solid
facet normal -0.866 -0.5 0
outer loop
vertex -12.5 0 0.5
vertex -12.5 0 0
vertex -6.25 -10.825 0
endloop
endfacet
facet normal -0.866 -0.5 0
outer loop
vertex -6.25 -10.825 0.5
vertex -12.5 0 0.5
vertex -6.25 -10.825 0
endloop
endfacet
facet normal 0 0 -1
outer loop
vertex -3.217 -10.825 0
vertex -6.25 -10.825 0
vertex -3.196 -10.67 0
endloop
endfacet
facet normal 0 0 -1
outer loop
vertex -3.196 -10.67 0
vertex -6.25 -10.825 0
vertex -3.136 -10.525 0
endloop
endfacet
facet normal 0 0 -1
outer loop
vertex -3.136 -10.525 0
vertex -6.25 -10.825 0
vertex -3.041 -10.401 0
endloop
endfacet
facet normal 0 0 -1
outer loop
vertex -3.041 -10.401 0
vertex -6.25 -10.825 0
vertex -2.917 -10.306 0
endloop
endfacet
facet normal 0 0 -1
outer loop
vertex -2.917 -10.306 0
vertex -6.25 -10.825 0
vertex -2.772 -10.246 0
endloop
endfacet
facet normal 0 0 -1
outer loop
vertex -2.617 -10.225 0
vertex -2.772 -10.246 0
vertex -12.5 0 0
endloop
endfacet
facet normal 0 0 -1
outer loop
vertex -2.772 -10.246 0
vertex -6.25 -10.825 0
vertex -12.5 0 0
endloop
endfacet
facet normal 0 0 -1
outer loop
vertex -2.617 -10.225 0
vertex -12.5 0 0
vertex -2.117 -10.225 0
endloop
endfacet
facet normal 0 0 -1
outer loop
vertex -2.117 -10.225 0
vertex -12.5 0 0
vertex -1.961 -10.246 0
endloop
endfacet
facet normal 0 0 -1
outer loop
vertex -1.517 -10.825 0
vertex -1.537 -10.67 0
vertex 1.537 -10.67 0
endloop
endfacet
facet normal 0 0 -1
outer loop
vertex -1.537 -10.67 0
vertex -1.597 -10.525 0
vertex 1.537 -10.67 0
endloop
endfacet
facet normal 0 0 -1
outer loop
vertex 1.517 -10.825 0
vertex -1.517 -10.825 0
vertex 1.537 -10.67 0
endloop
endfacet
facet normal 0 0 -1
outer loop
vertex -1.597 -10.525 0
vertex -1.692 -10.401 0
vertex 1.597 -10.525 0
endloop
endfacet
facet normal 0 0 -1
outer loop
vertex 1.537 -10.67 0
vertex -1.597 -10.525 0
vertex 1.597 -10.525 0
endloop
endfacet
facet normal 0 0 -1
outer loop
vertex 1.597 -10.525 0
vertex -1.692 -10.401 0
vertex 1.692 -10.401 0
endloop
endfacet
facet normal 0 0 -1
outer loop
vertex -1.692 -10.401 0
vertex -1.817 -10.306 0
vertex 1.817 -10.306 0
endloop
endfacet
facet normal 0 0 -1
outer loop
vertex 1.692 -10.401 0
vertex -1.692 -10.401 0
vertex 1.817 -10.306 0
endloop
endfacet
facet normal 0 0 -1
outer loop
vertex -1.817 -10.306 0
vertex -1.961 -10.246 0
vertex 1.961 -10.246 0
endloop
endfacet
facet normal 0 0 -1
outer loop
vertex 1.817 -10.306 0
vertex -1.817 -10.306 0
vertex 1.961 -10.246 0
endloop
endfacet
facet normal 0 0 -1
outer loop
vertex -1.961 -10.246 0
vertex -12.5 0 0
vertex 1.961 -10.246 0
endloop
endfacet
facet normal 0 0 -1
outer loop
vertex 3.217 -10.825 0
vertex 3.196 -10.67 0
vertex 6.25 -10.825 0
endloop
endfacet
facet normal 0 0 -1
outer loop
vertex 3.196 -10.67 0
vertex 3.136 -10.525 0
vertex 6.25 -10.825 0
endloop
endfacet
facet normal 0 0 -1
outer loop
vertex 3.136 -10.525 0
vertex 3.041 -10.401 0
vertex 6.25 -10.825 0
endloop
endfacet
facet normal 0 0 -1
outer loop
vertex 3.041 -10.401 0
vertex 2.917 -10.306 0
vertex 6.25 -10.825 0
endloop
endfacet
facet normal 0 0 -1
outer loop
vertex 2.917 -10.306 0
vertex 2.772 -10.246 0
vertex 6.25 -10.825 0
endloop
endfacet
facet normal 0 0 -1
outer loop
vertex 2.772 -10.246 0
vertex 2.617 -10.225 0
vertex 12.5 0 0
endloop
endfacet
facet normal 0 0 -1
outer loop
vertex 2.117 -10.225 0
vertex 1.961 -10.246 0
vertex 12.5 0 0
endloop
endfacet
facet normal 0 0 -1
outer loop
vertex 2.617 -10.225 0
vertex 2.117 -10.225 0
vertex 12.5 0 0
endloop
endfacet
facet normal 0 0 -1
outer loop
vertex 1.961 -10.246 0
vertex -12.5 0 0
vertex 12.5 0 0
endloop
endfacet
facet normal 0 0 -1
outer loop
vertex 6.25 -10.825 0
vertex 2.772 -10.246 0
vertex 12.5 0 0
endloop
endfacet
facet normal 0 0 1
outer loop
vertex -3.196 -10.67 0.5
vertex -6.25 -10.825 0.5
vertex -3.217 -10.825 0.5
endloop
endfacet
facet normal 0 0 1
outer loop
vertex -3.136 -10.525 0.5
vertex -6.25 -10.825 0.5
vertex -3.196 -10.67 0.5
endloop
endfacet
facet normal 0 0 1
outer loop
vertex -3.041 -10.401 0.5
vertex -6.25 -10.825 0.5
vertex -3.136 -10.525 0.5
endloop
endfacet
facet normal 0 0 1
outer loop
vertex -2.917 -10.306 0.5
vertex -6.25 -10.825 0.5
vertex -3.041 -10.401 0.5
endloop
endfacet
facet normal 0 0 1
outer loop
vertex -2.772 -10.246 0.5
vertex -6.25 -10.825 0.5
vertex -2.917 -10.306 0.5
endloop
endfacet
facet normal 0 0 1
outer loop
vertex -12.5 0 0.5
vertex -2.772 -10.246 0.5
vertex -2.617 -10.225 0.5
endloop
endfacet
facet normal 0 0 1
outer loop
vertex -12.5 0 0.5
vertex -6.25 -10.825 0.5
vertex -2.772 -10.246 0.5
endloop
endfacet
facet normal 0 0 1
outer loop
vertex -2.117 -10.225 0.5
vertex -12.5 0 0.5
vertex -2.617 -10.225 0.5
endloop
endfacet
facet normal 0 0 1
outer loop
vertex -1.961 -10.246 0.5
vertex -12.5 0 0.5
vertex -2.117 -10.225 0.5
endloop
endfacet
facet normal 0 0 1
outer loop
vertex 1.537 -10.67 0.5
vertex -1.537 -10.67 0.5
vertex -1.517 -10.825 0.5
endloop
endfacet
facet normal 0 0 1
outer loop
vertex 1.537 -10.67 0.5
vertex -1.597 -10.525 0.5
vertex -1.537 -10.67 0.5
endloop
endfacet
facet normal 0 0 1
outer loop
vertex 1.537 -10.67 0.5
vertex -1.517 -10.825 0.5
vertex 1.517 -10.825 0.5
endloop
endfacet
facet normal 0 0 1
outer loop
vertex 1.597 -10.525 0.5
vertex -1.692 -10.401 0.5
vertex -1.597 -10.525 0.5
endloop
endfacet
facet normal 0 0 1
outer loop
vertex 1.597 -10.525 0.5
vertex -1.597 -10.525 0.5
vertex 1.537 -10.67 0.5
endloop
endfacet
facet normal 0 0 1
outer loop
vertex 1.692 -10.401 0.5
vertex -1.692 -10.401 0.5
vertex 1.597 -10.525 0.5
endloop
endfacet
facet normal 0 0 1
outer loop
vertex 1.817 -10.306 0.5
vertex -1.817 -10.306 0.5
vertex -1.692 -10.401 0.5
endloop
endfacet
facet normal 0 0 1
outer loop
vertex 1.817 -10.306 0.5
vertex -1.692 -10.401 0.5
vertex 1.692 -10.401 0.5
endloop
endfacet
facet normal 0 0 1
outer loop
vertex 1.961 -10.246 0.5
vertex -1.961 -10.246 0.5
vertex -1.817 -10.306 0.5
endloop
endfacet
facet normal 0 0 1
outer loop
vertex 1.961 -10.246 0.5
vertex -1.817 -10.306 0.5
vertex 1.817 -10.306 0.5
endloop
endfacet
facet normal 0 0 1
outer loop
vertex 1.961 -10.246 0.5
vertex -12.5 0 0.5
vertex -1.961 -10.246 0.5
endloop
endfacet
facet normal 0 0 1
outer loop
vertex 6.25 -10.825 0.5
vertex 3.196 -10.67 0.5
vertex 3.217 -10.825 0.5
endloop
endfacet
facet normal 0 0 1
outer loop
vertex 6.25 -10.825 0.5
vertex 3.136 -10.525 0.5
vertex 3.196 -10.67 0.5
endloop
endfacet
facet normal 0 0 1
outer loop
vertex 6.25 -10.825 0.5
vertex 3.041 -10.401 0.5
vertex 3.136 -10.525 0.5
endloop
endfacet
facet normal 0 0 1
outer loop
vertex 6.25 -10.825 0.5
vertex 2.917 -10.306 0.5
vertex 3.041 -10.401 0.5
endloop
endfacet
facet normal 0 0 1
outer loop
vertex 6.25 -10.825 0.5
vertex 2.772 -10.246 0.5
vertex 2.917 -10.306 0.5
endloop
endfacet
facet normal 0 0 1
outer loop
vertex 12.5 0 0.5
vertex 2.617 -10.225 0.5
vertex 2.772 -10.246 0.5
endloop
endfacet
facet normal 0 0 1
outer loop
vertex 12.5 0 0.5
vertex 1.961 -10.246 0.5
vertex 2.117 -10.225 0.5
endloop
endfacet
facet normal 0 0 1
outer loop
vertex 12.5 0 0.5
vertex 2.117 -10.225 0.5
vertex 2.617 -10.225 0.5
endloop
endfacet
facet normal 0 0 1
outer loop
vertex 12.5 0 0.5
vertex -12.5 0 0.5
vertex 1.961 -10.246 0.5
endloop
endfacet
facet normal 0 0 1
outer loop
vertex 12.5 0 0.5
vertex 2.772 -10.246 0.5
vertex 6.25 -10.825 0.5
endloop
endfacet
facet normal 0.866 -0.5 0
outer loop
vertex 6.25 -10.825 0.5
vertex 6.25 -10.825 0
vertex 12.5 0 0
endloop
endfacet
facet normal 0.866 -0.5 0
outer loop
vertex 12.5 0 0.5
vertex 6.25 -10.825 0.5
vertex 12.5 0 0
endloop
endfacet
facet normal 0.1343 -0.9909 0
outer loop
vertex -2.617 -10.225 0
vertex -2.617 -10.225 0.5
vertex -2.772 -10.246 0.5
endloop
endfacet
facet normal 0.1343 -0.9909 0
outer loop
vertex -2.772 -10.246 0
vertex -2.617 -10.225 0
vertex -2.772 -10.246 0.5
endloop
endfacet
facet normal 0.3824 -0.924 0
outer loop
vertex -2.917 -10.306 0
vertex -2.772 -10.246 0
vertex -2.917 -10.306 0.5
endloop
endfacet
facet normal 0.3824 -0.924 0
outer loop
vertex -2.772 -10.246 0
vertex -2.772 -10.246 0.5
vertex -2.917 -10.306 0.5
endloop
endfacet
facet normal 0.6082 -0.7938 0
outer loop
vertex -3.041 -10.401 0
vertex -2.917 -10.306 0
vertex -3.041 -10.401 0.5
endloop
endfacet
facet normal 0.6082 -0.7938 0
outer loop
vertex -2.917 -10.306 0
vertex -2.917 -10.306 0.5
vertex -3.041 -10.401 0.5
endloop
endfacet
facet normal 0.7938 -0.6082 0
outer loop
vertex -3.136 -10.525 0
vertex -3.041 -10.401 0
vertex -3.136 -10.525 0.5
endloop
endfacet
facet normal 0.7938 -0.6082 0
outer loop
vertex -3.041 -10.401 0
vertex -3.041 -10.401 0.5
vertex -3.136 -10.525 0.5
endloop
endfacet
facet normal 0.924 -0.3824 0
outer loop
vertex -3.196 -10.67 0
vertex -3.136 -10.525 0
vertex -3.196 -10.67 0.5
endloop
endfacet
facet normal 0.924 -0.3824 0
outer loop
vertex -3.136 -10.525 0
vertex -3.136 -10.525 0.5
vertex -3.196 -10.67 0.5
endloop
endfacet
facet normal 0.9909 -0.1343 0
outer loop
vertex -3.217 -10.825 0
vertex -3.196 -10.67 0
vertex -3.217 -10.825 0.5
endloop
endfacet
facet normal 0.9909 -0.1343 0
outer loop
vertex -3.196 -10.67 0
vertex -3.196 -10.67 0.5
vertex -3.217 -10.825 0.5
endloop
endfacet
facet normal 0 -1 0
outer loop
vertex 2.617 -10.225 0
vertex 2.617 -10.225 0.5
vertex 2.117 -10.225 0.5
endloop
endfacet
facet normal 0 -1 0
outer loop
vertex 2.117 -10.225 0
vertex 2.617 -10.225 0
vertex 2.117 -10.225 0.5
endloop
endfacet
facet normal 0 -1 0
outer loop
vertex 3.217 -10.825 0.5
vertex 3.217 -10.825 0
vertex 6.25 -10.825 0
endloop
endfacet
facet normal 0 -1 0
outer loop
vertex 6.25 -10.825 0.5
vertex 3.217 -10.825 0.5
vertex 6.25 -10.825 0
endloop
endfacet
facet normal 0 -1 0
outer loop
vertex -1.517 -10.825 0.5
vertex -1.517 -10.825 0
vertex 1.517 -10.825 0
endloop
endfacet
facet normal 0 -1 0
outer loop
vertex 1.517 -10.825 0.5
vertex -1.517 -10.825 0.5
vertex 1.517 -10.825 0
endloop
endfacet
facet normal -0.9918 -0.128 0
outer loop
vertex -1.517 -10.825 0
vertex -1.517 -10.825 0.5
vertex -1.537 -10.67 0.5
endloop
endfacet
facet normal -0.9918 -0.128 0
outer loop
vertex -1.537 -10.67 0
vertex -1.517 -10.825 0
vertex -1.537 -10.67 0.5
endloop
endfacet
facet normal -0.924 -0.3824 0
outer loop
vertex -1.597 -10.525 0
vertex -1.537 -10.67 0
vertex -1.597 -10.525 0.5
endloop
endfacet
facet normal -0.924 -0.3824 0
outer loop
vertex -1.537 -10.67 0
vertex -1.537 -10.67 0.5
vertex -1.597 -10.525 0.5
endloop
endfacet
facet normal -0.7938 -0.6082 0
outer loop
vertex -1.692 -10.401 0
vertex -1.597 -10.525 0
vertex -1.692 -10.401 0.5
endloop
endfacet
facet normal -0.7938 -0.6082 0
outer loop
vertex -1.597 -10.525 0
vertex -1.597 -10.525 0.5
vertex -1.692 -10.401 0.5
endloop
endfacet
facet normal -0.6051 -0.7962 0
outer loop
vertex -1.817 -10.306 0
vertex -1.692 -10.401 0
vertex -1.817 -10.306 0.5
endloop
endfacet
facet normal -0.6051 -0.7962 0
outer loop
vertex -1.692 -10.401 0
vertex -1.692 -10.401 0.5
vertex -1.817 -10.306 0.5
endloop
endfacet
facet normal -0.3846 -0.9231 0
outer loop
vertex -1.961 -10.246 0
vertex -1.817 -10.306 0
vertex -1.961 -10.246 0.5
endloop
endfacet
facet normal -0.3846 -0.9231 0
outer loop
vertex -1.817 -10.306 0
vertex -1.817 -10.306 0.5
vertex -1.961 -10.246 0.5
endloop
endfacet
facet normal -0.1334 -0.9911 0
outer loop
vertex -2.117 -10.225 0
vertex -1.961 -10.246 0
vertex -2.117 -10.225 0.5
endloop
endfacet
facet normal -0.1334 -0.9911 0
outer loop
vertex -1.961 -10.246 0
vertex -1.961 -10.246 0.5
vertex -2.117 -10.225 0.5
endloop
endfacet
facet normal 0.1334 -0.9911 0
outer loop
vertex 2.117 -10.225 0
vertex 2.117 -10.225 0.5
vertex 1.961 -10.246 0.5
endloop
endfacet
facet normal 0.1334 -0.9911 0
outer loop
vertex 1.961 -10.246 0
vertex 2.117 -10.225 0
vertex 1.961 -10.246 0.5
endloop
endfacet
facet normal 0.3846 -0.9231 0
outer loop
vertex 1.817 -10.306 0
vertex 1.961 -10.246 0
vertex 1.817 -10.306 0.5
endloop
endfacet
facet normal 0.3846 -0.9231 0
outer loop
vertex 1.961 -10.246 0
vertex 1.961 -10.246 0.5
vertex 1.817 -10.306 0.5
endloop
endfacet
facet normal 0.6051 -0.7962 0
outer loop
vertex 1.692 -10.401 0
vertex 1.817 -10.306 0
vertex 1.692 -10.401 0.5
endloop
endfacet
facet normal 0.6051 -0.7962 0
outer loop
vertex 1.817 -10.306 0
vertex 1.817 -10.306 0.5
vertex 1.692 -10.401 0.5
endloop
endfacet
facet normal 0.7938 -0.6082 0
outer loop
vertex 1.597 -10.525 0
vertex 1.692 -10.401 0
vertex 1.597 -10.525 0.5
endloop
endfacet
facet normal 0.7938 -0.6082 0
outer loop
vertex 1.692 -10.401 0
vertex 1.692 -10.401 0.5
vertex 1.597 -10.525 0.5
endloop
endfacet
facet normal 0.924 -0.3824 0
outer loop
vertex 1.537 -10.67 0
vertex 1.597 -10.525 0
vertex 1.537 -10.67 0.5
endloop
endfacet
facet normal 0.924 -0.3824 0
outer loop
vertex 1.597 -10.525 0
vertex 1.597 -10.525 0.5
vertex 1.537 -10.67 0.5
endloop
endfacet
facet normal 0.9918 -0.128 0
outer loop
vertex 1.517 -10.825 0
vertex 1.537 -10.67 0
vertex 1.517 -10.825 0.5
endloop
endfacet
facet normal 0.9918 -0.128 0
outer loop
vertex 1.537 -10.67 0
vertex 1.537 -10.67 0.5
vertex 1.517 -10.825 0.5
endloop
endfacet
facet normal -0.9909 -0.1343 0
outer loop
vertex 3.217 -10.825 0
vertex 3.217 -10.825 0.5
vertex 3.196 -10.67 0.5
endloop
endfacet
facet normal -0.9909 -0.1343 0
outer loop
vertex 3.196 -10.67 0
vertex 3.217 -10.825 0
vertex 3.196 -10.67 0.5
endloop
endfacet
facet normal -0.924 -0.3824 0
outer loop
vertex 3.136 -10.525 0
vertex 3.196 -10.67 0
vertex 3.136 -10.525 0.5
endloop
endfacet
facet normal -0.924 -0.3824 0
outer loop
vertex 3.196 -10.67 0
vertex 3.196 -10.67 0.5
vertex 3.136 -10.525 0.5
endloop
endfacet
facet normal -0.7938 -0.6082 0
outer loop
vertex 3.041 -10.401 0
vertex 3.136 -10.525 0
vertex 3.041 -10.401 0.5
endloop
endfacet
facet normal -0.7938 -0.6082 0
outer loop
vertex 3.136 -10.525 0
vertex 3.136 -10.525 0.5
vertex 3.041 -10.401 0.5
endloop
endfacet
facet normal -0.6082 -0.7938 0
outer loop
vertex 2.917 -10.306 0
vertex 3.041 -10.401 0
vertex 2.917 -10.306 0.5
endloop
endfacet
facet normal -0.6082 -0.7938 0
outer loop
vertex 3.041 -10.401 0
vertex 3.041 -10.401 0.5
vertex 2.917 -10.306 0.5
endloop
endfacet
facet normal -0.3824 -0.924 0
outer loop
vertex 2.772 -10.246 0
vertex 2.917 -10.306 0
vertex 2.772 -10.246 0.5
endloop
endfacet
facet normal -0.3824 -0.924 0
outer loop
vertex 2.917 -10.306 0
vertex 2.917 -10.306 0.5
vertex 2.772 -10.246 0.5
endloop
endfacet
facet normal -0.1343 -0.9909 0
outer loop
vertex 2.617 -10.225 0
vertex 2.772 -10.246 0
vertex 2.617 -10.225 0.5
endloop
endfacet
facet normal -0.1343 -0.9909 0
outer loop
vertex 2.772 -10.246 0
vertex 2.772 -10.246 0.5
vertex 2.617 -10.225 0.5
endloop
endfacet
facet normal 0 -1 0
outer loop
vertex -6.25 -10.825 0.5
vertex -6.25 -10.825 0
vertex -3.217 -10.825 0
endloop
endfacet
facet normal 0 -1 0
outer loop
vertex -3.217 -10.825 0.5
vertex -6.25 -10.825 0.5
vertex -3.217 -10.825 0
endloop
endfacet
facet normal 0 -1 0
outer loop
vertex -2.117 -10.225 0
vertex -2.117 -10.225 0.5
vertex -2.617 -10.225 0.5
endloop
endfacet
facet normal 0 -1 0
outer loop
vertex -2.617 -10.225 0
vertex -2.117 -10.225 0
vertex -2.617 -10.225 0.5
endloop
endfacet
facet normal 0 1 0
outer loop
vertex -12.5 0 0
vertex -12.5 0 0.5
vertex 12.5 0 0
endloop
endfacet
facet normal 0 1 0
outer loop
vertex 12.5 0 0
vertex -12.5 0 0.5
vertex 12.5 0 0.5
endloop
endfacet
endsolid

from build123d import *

# Parameters (mm, degrees)
F1_DEPTH = 0.5
F3_DEPTH = 0.501
F5_DEPTH = 0.501


with BuildPart() as f1:
    # F0 (on Top) → F1 (new body)
    with BuildSketch(Plane.XY):
        Polygon((6.25, -10.825318), (12.5, 0), (6.25, 10.825318), (-6.25, 10.825318), (-12.5, 0), (-6.25, -10.825318), align=None)
    extrude(amount=F1_DEPTH)

    # F2 (on face) → F3 (cut, through all)
    with BuildSketch(Plane.XY.offset(0.5)):
        with BuildLine():
            ThreePointArc((3.216667, -10.825318), (3.040931, -10.401053), (2.616667, -10.225318))
            Line((2.616667, -10.225318), (2.116667, -10.225318))
            ThreePointArc((2.116667, -10.225318), (1.692403, -10.401053), (1.516667, -10.825318))
            Line((1.516667, -10.825318), (3.216667, -10.825318))
        make_face()
        with BuildLine():
            Line((-3.216667, -10.825318), (-1.516667, -10.825318))
            ThreePointArc((-1.516667, -10.825318), (-1.692403, -10.401053), (-2.116667, -10.225318))
            Line((-2.116667, -10.225318), (-2.616667, -10.225318))
            ThreePointArc((-2.616667, -10.225318), (-3.040931, -10.401053), (-3.216667, -10.825318))
        make_face()
    extrude(amount=-F3_DEPTH, mode=Mode.SUBTRACT)

    # F4 (on face) → F5 (cut, through all)
    with BuildSketch(Plane.XY.offset(0.5)):
        Polygon((-6.25, 10.825318), (-12.5, 0), (12.5, 0), (6.25, 10.825318), align=None)
    extrude(amount=-F5_DEPTH, mode=Mode.SUBTRACT)


solid = f1.part
